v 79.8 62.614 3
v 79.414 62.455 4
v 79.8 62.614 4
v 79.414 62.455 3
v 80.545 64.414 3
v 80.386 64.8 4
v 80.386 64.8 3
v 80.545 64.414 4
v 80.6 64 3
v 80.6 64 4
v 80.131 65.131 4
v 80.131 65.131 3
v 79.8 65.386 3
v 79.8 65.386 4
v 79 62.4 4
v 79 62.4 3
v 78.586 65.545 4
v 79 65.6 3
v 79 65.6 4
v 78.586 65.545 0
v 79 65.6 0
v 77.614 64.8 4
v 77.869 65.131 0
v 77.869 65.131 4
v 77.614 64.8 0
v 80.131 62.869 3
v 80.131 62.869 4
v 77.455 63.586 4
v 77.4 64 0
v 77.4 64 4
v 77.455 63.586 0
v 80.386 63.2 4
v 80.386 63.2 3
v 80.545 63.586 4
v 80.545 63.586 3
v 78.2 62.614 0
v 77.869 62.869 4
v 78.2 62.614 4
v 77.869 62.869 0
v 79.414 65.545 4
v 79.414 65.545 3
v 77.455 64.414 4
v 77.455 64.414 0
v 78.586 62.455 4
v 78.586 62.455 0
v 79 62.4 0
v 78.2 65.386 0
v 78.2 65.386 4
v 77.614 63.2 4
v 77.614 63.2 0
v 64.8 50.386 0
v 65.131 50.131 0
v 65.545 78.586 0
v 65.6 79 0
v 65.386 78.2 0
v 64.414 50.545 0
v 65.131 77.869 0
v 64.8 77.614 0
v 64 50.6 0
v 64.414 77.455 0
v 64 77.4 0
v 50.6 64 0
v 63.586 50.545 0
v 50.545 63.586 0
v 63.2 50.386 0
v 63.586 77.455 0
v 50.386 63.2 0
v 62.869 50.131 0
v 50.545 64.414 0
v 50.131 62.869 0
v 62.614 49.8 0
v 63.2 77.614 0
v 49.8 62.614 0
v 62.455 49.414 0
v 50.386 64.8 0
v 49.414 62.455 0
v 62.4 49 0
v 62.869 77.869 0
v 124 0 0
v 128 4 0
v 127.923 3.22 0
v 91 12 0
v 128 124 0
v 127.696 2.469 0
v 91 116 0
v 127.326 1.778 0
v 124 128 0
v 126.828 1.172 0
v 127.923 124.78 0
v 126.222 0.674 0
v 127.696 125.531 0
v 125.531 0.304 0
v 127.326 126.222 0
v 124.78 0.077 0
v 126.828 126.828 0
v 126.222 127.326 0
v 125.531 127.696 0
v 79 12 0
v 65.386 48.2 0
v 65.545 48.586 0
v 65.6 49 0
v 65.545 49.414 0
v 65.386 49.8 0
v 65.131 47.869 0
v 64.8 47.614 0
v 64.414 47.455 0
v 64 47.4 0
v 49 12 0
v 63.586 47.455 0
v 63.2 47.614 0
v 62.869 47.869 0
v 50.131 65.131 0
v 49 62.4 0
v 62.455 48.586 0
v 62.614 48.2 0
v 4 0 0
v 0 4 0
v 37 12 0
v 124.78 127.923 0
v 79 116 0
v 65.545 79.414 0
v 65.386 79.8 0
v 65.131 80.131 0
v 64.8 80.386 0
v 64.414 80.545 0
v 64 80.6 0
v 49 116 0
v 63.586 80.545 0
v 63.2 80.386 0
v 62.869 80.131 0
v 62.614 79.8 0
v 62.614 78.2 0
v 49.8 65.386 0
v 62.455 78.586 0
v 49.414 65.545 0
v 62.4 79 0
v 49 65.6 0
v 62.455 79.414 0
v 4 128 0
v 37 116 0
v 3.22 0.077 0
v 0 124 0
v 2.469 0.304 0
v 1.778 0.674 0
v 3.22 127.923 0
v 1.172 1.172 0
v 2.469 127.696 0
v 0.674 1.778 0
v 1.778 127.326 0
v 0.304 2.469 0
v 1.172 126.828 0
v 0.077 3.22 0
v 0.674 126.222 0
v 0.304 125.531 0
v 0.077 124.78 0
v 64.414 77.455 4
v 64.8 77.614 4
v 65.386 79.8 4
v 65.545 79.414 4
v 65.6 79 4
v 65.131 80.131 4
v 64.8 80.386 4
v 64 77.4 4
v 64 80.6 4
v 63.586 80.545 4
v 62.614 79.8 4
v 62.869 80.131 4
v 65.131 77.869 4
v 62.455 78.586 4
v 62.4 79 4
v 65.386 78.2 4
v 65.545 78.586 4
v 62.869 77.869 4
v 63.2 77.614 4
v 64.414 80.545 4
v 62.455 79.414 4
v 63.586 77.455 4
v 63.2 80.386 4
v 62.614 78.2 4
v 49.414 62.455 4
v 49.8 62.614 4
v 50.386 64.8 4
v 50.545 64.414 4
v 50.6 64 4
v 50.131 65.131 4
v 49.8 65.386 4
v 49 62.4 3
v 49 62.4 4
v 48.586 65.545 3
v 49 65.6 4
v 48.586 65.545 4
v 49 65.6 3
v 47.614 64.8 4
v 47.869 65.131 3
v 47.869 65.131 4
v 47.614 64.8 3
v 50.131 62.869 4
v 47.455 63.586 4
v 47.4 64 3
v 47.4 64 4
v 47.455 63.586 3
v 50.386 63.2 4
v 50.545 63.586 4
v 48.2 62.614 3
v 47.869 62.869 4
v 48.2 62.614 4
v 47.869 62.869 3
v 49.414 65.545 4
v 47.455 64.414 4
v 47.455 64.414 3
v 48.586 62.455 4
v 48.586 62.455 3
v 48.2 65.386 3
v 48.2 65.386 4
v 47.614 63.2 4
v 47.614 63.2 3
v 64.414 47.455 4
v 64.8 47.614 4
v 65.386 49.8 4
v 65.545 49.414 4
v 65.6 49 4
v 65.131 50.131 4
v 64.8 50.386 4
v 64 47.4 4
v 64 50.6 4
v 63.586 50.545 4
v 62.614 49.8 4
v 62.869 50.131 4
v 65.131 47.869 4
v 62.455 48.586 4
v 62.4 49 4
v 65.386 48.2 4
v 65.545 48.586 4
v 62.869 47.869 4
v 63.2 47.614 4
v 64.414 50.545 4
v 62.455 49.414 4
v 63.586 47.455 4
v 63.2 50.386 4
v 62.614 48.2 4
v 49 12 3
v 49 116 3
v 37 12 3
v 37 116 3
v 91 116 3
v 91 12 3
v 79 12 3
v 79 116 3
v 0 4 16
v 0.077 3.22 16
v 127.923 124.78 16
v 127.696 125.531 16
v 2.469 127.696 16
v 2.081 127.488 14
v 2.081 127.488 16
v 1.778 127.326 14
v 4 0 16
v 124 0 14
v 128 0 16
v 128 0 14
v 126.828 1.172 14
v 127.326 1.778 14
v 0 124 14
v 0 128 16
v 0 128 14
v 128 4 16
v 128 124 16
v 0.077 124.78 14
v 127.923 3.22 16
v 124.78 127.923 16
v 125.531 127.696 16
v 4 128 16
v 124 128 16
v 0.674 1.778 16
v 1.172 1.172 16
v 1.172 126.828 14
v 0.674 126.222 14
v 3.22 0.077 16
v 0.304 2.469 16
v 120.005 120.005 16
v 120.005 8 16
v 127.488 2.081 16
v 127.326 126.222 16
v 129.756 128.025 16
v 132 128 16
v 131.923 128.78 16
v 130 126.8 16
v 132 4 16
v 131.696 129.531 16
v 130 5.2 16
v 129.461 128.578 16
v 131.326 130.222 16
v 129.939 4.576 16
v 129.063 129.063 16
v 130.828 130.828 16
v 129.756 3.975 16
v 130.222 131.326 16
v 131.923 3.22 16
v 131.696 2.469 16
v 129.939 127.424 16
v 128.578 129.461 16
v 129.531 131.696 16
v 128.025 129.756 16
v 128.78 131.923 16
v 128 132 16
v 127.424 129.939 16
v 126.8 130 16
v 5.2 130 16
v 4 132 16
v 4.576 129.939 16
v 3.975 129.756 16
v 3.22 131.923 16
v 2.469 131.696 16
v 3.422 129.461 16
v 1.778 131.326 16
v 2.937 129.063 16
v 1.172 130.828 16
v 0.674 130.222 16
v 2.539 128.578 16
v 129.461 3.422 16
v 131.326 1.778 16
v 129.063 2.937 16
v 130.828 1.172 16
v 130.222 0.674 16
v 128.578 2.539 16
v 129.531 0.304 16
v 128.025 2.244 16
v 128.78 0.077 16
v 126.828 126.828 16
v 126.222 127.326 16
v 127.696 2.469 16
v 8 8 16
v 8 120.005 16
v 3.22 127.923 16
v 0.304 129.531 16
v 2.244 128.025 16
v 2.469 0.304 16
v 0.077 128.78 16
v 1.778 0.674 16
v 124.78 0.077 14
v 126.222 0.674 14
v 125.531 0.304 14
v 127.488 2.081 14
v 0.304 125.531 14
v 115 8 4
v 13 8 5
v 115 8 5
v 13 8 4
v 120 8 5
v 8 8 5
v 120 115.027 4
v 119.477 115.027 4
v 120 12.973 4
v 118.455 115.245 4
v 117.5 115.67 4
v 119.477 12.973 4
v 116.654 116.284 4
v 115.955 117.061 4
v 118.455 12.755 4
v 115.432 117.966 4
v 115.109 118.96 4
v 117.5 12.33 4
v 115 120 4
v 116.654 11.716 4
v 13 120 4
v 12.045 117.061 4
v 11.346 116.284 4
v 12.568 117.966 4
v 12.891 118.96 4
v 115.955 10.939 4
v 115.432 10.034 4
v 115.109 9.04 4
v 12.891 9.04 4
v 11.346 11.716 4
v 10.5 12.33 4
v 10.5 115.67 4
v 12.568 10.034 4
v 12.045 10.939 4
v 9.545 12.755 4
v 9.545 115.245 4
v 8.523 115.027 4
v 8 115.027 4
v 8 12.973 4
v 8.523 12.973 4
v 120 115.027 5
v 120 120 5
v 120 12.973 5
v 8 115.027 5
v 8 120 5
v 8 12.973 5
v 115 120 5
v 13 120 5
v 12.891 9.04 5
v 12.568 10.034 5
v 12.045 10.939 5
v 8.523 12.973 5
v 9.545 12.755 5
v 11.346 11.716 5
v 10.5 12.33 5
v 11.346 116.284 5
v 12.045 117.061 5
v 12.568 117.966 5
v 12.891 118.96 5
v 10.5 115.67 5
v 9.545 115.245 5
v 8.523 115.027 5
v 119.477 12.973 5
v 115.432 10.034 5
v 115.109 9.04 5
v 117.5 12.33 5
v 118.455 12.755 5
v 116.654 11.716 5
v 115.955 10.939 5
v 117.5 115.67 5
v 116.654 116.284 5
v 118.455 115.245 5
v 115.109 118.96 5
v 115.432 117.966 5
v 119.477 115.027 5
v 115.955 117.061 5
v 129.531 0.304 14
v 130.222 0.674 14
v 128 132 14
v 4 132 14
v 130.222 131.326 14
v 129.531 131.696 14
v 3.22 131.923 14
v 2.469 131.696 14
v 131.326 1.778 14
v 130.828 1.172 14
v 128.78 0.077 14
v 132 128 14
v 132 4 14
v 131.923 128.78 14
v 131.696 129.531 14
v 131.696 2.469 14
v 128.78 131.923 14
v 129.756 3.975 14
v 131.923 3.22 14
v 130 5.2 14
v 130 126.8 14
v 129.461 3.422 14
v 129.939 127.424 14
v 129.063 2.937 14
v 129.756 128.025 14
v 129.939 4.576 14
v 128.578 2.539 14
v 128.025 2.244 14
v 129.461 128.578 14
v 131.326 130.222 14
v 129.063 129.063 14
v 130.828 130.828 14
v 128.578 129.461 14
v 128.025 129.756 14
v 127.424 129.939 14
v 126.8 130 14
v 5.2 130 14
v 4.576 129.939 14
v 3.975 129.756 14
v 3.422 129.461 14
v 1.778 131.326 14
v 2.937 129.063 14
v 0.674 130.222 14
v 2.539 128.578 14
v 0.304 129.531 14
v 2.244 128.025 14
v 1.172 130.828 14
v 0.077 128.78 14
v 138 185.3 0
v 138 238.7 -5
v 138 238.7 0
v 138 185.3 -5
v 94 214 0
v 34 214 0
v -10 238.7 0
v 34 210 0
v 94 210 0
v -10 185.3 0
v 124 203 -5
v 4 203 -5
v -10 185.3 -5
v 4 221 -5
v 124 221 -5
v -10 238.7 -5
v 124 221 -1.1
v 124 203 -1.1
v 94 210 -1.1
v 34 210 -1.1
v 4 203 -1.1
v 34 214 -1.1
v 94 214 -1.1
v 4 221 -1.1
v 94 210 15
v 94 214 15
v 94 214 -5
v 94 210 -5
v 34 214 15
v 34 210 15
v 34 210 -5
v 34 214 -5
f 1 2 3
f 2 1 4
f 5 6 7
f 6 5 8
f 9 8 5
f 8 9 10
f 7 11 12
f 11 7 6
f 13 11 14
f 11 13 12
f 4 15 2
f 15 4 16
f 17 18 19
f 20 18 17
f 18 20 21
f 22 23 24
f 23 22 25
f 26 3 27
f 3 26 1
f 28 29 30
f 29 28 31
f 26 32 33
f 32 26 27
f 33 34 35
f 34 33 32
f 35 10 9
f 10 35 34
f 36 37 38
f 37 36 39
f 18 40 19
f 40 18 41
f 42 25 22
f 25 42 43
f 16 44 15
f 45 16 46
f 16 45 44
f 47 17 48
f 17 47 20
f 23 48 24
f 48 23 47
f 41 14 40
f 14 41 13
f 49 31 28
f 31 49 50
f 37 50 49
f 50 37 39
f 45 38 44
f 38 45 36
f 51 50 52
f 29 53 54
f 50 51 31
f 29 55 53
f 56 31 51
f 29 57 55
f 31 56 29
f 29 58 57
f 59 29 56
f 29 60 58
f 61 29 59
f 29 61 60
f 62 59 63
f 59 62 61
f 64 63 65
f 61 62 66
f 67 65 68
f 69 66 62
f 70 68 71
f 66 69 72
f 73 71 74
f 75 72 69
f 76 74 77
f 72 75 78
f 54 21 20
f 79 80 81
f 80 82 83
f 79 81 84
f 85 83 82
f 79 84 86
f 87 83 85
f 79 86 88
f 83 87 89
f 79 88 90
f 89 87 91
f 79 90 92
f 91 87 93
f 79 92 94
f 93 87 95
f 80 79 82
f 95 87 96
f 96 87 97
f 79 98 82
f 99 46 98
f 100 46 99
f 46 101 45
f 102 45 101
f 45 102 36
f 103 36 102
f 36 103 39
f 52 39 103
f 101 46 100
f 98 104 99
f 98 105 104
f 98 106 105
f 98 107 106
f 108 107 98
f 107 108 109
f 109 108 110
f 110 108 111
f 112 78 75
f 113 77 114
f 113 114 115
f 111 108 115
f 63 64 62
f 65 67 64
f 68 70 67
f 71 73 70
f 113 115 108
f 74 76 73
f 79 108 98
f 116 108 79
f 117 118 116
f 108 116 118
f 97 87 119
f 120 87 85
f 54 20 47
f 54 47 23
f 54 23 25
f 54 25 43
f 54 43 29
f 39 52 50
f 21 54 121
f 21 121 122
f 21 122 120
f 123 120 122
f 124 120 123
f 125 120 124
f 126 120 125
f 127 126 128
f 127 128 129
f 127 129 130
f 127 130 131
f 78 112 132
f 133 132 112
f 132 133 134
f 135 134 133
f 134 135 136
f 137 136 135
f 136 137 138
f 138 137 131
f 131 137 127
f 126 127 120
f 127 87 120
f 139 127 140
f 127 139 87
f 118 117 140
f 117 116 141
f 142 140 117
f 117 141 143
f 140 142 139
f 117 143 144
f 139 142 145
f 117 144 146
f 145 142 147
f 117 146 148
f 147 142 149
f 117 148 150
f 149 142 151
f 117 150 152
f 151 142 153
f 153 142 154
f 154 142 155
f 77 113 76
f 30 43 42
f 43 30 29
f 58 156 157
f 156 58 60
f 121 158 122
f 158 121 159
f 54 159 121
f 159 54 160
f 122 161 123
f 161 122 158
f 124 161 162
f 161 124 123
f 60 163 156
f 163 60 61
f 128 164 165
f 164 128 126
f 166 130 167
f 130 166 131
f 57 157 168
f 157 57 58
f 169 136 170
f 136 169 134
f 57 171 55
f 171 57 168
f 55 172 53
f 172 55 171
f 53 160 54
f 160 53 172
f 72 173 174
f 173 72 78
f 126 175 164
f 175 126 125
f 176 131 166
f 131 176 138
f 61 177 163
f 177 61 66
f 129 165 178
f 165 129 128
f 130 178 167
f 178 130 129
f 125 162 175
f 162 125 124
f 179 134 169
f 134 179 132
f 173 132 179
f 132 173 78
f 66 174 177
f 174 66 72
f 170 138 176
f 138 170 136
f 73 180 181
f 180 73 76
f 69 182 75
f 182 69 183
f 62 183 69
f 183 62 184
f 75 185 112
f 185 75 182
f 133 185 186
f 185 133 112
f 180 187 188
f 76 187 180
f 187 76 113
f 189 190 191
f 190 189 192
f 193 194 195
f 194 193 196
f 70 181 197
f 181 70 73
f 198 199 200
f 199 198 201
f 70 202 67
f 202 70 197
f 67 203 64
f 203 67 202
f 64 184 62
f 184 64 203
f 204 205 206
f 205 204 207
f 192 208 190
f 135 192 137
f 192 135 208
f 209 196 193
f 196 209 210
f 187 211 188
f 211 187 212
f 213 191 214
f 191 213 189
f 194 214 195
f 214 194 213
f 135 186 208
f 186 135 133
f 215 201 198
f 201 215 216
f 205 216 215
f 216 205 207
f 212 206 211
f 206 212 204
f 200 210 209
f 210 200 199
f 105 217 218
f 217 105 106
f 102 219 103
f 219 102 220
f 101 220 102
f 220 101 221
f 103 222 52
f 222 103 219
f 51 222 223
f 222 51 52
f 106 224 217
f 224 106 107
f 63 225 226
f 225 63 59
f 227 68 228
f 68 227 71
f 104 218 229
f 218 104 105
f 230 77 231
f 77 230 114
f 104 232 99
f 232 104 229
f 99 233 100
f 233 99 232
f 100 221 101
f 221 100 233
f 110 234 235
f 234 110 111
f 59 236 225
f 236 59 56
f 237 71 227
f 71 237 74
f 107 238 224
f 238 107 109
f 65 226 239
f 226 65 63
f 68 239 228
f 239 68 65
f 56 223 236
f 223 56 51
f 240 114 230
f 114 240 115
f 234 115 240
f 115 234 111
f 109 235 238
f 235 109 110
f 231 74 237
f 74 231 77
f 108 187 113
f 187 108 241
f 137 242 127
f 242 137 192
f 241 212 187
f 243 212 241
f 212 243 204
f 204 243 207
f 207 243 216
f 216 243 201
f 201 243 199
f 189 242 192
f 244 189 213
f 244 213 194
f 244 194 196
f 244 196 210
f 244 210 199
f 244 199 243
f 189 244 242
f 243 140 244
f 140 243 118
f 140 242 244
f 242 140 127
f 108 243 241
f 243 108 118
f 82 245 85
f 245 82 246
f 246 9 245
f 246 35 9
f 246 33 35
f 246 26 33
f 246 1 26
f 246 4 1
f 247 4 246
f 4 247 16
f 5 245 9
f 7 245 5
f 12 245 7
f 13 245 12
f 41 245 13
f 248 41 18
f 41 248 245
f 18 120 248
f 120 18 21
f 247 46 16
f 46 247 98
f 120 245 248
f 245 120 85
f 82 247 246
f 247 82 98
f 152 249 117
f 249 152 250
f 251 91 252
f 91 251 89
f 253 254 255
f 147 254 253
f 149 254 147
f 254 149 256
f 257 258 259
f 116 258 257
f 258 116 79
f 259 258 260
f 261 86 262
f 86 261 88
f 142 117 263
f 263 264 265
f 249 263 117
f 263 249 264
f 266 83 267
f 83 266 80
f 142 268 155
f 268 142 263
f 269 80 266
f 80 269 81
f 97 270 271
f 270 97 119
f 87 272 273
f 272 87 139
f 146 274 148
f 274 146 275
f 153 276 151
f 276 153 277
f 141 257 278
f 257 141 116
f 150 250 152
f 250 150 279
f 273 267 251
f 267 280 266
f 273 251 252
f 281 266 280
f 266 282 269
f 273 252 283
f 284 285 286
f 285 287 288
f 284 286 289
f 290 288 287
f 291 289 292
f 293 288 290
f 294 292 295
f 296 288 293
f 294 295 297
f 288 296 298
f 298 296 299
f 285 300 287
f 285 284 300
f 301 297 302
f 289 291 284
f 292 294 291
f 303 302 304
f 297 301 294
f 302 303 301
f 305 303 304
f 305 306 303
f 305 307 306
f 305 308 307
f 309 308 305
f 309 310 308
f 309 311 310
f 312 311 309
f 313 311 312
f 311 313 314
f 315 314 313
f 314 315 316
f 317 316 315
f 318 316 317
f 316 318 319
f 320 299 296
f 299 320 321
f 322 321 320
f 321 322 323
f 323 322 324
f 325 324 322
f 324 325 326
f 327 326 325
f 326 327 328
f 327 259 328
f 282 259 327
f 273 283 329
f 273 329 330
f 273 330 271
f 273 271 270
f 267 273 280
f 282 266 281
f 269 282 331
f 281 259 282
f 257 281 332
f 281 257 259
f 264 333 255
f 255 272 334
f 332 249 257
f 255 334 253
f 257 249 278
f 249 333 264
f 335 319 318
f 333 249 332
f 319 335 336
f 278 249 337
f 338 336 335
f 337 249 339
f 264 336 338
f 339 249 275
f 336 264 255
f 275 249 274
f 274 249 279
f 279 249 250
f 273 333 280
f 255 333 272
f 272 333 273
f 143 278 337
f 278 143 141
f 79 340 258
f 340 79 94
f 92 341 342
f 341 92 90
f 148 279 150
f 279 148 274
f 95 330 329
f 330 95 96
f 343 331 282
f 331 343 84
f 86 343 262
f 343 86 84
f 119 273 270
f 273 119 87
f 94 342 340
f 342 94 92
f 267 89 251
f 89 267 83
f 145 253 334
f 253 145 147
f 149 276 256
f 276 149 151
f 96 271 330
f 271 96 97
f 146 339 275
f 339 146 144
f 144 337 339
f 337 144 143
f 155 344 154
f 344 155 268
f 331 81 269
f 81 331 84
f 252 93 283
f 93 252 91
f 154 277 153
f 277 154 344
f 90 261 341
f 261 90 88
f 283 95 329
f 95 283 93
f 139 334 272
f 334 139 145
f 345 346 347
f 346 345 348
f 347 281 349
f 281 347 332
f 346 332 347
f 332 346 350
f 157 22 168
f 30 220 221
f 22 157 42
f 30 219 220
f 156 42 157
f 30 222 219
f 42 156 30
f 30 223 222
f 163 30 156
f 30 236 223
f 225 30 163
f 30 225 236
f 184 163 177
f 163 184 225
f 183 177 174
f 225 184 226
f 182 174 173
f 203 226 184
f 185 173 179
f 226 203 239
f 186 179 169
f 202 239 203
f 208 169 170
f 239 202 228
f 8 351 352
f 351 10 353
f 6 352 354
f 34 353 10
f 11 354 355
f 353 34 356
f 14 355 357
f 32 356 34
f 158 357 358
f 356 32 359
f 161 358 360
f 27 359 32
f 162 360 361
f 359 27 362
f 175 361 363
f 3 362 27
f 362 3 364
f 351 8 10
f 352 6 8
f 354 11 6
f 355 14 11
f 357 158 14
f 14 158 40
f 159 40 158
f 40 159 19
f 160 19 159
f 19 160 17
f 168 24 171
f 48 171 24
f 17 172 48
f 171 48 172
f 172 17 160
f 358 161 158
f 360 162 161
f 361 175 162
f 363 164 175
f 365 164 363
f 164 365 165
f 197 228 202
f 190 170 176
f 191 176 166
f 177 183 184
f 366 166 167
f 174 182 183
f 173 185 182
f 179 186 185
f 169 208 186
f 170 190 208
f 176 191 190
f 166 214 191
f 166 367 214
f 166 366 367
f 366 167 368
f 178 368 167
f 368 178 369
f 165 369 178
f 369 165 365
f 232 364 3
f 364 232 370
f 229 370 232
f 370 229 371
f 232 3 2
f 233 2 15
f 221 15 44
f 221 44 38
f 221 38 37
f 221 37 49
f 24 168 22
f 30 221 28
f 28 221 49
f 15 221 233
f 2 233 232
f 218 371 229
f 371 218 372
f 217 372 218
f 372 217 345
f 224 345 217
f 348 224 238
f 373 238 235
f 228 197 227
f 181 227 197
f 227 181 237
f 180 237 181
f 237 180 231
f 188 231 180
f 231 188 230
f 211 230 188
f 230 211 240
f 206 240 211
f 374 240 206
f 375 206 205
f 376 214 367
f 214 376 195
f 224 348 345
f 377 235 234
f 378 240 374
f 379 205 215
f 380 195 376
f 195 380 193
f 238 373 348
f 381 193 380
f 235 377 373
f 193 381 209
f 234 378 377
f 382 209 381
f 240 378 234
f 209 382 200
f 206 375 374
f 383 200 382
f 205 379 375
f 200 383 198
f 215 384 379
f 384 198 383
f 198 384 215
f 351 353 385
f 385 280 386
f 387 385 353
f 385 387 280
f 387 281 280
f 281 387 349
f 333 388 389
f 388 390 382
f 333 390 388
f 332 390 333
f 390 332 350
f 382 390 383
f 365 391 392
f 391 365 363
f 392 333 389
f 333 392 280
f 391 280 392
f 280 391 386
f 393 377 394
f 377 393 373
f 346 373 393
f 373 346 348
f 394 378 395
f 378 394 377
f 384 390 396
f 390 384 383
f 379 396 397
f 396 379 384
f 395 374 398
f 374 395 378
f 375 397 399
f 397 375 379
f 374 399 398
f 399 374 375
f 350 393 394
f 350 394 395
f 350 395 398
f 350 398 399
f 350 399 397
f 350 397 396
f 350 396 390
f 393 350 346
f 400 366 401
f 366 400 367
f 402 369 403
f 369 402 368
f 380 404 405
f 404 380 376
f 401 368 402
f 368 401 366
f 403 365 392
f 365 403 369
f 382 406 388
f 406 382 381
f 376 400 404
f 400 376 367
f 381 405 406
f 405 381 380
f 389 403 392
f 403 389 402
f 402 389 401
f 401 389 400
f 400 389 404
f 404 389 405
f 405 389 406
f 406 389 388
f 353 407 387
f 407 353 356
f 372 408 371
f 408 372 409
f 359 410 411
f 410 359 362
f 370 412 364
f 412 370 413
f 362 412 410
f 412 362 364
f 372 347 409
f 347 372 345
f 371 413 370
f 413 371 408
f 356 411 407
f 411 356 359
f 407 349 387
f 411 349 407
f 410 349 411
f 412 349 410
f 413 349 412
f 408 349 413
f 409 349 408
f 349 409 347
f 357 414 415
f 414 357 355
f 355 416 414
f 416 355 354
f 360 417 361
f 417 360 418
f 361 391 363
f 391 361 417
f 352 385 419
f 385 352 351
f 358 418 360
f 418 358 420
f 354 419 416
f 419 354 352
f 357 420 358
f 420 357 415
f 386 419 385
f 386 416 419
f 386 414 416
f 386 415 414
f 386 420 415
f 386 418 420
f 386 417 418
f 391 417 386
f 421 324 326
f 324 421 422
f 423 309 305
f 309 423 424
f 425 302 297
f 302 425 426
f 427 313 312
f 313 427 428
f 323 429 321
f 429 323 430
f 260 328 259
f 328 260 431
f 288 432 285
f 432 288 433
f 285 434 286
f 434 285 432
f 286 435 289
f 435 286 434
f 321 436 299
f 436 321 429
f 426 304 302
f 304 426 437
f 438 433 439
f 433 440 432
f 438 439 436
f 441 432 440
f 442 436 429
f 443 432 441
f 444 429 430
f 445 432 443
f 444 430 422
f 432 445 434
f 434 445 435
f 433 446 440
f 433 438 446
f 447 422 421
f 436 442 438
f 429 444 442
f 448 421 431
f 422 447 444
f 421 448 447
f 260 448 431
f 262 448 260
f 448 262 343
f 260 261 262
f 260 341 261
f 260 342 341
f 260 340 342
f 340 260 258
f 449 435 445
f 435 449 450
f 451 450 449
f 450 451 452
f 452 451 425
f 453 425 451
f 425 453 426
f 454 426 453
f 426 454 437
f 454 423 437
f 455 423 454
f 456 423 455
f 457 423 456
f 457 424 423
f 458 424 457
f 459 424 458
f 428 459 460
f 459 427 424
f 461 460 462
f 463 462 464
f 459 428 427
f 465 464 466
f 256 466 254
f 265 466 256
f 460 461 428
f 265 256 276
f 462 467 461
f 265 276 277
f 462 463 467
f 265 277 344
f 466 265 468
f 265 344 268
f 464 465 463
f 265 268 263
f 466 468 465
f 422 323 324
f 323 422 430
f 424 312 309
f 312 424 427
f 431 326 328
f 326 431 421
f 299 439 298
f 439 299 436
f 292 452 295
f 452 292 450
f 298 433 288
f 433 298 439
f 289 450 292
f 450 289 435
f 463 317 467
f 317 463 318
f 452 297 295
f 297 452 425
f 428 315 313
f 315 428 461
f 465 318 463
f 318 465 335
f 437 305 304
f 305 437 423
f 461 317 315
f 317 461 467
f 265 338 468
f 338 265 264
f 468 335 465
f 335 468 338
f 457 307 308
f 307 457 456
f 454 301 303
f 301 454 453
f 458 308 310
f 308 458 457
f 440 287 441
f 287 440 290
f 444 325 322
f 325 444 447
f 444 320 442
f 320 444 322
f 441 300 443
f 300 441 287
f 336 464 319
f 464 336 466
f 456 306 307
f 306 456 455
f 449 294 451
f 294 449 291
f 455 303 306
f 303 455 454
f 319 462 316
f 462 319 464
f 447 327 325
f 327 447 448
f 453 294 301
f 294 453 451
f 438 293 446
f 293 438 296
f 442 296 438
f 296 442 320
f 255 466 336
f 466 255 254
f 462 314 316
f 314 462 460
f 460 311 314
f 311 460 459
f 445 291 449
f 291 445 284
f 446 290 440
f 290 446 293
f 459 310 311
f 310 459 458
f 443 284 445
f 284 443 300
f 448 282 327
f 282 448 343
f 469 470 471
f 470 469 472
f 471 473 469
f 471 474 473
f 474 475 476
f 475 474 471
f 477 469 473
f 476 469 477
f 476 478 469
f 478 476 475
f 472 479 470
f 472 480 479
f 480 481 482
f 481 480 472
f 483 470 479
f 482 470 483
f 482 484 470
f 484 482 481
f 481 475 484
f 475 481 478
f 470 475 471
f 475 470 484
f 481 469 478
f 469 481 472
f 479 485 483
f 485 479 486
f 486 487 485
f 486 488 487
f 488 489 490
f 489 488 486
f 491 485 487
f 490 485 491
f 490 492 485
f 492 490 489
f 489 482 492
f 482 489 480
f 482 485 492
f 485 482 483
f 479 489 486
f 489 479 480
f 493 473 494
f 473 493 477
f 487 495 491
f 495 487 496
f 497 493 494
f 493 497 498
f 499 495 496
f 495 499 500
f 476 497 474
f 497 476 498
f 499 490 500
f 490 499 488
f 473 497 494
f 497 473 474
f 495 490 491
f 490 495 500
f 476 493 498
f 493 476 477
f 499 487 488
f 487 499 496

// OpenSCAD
// Sonic-Ferrocrete Bench Tray + Magnet Sled (Parametric)

// Units: mm

// Usage: tweak "User Parameters", F6 (Render), then export STL.

tray_len = 120;  // inner X (liquid)
tray_wid = 120;  // inner Y
wall_h   = 12;
wall_t   = 4;
floor_t  = 4;
corner_r = 4;

lip_t = 2; lip_h = 2; add_lip = true;

// Feet

feet_d = 10; feet_h = 5; feet_inset = 8;

// Transducer bolt circle (set mount_enable=false if epoxying puck)

mount_enable=true; mount_holes=4; mount_bc_diam=30; mount_hole_d=3.2;

mount_center_offset=[0,0];

// Under-tray magnet rails

rails_enable=true; rail_w=12; rail_h=3; rail_gap=30; rail_inset_y=12;

// Magnet sled (printed separately)

sled_len = tray_len + 2*wall_t + 20;

sled_wid = rail_gap + 2*rail_w - 0.6;

sled_h = rail_h + 2; sled_handle_h=20;

mag_slot_len = tray_len; mag_slot_wid=18; mag_slot_d=4;

// Draft for inner walls

draft_deg=2;

module filleted_box_xy(size=[20,20,10], r=2){

  translate([r,r,0])

  minkowski(){ cube([size[0]-2*r,size[1]-2*r,size[2]-0.001]);

               cylinder(r=r,h=0.001,$fn=32); }

}

module drafted_tray(inner=[100,100], wall=4,h=12,floor=4,r=3,draft_deg=2){

  outer=[inner[0]+2*wall, inner[1]+2*wall, floor+h];

  difference(){

    filleted_box_xy(outer,r=r);

    translate([wall,wall,floor])

    linear_extrude(height=h+0.1,

      scale=1 + 2*wall * tan(draft_deg/180*3.14159) / inner[0])

    offset(r=-r) square([inner[0],inner[1]]);

    if(mount_enable)

      for(i=[0:mount_holes-1]){

        angle=360/mount_holes*i;

        x=mount_center_offset[0]+(mount_bc_diam/2)*cos(angle);

        y=mount_center_offset[1]+(mount_bc_diam/2)*sin(angle);

        translate([outer[0]/2+x, outer[1]/2+y, 0])

          cylinder(d=mount_hole_d,h=floor+1,$fn=24);

      }

    if(rails_enable){

      outerX=outer[0]; outerY=outer[1];

      rail_total_w=2*rail_w+rail_gap;

      rail_start=rail_inset_y; rail_end=outerY-rail_inset_y;

      translate([(outerX-rail_total_w)/2, rail_start, 0])

        cube([rail_w, rail_end-rail_start, rail_h]);

      translate([(outerX-rail_total_w)/2+rail_w+rail_gap, rail_start, 0])

        cube([rail_w, rail_end-rail_start, rail_h]);

    }

  }

}

module add_lip(outer=[120,120,18],wall=4,lip_t=2,lip_h=2,r=3){

  translate([0,0,outer[2]-lip_h])

  difference(){

    filleted_box_xy([outer[0]+2*lip_t, outer[1]+2*lip_t, lip_h], r=r);

    translate([lip_t,lip_t,-0.1])

      filleted_box_xy([outer[0],outer[1],lip_h+0.2], r=max(r-0.8,0.5));

  }

}

module feet_posts(outer=[120,120,18],d=10,h=5,inset=8){

  for(sx=[inset, outer[0]-inset])

  for(sy=[inset, outer[1]-inset])

    translate([sx,sy,0]) cylinder(d=d,h=h,$fn=30);

}

module tray_assembly(){

  outer=[tray_len+2*wall_t, tray_wid+2*wall_t, floor_t+wall_h];

  drafted_tray([tray_len,tray_wid], wall_t, wall_h, floor_t, corner_r, draft_deg);

  feet_posts(outer,feet_d,feet_h,feet_inset);

  if(add_lip) add_lip(outer,wall_t,lip_t,lip_h,corner_r);

}

module magnet_sled(){

  outer=[tray_len+2*wall_t, tray_wid+2*wall_t, floor_t+wall_h];

  sledX=sled_len; sledY=rail_gap+2*rail_w-0.6;

  difference(){

    translate([(outer[0]-sledX)/2,(outer[1]-sledY)/2,-sled_h])

      cube([sledX,sledY,sled_h]);

    translate([(outer[0]-mag_slot_len)/2,(outer[1]-mag_slot_wid)/2,-sled_h-0.1])

      cube([mag_slot_len,mag_slot_wid,mag_slot_d]);

  }

  translate([outer[0]/2-30,(outer[1]-sledY)/2 + sledY/2 - 2,-sled_h])

    cube([60,4,sled_handle_h]);

}

$fn=64;

// Uncomment to export:

// tray_assembly();

// magnet_sled();

// Preview:

translate([0,0,0]) tray_assembly();

translate([0, tray_wid + 2*wall_t + 20, 0]) magnet_sled();
